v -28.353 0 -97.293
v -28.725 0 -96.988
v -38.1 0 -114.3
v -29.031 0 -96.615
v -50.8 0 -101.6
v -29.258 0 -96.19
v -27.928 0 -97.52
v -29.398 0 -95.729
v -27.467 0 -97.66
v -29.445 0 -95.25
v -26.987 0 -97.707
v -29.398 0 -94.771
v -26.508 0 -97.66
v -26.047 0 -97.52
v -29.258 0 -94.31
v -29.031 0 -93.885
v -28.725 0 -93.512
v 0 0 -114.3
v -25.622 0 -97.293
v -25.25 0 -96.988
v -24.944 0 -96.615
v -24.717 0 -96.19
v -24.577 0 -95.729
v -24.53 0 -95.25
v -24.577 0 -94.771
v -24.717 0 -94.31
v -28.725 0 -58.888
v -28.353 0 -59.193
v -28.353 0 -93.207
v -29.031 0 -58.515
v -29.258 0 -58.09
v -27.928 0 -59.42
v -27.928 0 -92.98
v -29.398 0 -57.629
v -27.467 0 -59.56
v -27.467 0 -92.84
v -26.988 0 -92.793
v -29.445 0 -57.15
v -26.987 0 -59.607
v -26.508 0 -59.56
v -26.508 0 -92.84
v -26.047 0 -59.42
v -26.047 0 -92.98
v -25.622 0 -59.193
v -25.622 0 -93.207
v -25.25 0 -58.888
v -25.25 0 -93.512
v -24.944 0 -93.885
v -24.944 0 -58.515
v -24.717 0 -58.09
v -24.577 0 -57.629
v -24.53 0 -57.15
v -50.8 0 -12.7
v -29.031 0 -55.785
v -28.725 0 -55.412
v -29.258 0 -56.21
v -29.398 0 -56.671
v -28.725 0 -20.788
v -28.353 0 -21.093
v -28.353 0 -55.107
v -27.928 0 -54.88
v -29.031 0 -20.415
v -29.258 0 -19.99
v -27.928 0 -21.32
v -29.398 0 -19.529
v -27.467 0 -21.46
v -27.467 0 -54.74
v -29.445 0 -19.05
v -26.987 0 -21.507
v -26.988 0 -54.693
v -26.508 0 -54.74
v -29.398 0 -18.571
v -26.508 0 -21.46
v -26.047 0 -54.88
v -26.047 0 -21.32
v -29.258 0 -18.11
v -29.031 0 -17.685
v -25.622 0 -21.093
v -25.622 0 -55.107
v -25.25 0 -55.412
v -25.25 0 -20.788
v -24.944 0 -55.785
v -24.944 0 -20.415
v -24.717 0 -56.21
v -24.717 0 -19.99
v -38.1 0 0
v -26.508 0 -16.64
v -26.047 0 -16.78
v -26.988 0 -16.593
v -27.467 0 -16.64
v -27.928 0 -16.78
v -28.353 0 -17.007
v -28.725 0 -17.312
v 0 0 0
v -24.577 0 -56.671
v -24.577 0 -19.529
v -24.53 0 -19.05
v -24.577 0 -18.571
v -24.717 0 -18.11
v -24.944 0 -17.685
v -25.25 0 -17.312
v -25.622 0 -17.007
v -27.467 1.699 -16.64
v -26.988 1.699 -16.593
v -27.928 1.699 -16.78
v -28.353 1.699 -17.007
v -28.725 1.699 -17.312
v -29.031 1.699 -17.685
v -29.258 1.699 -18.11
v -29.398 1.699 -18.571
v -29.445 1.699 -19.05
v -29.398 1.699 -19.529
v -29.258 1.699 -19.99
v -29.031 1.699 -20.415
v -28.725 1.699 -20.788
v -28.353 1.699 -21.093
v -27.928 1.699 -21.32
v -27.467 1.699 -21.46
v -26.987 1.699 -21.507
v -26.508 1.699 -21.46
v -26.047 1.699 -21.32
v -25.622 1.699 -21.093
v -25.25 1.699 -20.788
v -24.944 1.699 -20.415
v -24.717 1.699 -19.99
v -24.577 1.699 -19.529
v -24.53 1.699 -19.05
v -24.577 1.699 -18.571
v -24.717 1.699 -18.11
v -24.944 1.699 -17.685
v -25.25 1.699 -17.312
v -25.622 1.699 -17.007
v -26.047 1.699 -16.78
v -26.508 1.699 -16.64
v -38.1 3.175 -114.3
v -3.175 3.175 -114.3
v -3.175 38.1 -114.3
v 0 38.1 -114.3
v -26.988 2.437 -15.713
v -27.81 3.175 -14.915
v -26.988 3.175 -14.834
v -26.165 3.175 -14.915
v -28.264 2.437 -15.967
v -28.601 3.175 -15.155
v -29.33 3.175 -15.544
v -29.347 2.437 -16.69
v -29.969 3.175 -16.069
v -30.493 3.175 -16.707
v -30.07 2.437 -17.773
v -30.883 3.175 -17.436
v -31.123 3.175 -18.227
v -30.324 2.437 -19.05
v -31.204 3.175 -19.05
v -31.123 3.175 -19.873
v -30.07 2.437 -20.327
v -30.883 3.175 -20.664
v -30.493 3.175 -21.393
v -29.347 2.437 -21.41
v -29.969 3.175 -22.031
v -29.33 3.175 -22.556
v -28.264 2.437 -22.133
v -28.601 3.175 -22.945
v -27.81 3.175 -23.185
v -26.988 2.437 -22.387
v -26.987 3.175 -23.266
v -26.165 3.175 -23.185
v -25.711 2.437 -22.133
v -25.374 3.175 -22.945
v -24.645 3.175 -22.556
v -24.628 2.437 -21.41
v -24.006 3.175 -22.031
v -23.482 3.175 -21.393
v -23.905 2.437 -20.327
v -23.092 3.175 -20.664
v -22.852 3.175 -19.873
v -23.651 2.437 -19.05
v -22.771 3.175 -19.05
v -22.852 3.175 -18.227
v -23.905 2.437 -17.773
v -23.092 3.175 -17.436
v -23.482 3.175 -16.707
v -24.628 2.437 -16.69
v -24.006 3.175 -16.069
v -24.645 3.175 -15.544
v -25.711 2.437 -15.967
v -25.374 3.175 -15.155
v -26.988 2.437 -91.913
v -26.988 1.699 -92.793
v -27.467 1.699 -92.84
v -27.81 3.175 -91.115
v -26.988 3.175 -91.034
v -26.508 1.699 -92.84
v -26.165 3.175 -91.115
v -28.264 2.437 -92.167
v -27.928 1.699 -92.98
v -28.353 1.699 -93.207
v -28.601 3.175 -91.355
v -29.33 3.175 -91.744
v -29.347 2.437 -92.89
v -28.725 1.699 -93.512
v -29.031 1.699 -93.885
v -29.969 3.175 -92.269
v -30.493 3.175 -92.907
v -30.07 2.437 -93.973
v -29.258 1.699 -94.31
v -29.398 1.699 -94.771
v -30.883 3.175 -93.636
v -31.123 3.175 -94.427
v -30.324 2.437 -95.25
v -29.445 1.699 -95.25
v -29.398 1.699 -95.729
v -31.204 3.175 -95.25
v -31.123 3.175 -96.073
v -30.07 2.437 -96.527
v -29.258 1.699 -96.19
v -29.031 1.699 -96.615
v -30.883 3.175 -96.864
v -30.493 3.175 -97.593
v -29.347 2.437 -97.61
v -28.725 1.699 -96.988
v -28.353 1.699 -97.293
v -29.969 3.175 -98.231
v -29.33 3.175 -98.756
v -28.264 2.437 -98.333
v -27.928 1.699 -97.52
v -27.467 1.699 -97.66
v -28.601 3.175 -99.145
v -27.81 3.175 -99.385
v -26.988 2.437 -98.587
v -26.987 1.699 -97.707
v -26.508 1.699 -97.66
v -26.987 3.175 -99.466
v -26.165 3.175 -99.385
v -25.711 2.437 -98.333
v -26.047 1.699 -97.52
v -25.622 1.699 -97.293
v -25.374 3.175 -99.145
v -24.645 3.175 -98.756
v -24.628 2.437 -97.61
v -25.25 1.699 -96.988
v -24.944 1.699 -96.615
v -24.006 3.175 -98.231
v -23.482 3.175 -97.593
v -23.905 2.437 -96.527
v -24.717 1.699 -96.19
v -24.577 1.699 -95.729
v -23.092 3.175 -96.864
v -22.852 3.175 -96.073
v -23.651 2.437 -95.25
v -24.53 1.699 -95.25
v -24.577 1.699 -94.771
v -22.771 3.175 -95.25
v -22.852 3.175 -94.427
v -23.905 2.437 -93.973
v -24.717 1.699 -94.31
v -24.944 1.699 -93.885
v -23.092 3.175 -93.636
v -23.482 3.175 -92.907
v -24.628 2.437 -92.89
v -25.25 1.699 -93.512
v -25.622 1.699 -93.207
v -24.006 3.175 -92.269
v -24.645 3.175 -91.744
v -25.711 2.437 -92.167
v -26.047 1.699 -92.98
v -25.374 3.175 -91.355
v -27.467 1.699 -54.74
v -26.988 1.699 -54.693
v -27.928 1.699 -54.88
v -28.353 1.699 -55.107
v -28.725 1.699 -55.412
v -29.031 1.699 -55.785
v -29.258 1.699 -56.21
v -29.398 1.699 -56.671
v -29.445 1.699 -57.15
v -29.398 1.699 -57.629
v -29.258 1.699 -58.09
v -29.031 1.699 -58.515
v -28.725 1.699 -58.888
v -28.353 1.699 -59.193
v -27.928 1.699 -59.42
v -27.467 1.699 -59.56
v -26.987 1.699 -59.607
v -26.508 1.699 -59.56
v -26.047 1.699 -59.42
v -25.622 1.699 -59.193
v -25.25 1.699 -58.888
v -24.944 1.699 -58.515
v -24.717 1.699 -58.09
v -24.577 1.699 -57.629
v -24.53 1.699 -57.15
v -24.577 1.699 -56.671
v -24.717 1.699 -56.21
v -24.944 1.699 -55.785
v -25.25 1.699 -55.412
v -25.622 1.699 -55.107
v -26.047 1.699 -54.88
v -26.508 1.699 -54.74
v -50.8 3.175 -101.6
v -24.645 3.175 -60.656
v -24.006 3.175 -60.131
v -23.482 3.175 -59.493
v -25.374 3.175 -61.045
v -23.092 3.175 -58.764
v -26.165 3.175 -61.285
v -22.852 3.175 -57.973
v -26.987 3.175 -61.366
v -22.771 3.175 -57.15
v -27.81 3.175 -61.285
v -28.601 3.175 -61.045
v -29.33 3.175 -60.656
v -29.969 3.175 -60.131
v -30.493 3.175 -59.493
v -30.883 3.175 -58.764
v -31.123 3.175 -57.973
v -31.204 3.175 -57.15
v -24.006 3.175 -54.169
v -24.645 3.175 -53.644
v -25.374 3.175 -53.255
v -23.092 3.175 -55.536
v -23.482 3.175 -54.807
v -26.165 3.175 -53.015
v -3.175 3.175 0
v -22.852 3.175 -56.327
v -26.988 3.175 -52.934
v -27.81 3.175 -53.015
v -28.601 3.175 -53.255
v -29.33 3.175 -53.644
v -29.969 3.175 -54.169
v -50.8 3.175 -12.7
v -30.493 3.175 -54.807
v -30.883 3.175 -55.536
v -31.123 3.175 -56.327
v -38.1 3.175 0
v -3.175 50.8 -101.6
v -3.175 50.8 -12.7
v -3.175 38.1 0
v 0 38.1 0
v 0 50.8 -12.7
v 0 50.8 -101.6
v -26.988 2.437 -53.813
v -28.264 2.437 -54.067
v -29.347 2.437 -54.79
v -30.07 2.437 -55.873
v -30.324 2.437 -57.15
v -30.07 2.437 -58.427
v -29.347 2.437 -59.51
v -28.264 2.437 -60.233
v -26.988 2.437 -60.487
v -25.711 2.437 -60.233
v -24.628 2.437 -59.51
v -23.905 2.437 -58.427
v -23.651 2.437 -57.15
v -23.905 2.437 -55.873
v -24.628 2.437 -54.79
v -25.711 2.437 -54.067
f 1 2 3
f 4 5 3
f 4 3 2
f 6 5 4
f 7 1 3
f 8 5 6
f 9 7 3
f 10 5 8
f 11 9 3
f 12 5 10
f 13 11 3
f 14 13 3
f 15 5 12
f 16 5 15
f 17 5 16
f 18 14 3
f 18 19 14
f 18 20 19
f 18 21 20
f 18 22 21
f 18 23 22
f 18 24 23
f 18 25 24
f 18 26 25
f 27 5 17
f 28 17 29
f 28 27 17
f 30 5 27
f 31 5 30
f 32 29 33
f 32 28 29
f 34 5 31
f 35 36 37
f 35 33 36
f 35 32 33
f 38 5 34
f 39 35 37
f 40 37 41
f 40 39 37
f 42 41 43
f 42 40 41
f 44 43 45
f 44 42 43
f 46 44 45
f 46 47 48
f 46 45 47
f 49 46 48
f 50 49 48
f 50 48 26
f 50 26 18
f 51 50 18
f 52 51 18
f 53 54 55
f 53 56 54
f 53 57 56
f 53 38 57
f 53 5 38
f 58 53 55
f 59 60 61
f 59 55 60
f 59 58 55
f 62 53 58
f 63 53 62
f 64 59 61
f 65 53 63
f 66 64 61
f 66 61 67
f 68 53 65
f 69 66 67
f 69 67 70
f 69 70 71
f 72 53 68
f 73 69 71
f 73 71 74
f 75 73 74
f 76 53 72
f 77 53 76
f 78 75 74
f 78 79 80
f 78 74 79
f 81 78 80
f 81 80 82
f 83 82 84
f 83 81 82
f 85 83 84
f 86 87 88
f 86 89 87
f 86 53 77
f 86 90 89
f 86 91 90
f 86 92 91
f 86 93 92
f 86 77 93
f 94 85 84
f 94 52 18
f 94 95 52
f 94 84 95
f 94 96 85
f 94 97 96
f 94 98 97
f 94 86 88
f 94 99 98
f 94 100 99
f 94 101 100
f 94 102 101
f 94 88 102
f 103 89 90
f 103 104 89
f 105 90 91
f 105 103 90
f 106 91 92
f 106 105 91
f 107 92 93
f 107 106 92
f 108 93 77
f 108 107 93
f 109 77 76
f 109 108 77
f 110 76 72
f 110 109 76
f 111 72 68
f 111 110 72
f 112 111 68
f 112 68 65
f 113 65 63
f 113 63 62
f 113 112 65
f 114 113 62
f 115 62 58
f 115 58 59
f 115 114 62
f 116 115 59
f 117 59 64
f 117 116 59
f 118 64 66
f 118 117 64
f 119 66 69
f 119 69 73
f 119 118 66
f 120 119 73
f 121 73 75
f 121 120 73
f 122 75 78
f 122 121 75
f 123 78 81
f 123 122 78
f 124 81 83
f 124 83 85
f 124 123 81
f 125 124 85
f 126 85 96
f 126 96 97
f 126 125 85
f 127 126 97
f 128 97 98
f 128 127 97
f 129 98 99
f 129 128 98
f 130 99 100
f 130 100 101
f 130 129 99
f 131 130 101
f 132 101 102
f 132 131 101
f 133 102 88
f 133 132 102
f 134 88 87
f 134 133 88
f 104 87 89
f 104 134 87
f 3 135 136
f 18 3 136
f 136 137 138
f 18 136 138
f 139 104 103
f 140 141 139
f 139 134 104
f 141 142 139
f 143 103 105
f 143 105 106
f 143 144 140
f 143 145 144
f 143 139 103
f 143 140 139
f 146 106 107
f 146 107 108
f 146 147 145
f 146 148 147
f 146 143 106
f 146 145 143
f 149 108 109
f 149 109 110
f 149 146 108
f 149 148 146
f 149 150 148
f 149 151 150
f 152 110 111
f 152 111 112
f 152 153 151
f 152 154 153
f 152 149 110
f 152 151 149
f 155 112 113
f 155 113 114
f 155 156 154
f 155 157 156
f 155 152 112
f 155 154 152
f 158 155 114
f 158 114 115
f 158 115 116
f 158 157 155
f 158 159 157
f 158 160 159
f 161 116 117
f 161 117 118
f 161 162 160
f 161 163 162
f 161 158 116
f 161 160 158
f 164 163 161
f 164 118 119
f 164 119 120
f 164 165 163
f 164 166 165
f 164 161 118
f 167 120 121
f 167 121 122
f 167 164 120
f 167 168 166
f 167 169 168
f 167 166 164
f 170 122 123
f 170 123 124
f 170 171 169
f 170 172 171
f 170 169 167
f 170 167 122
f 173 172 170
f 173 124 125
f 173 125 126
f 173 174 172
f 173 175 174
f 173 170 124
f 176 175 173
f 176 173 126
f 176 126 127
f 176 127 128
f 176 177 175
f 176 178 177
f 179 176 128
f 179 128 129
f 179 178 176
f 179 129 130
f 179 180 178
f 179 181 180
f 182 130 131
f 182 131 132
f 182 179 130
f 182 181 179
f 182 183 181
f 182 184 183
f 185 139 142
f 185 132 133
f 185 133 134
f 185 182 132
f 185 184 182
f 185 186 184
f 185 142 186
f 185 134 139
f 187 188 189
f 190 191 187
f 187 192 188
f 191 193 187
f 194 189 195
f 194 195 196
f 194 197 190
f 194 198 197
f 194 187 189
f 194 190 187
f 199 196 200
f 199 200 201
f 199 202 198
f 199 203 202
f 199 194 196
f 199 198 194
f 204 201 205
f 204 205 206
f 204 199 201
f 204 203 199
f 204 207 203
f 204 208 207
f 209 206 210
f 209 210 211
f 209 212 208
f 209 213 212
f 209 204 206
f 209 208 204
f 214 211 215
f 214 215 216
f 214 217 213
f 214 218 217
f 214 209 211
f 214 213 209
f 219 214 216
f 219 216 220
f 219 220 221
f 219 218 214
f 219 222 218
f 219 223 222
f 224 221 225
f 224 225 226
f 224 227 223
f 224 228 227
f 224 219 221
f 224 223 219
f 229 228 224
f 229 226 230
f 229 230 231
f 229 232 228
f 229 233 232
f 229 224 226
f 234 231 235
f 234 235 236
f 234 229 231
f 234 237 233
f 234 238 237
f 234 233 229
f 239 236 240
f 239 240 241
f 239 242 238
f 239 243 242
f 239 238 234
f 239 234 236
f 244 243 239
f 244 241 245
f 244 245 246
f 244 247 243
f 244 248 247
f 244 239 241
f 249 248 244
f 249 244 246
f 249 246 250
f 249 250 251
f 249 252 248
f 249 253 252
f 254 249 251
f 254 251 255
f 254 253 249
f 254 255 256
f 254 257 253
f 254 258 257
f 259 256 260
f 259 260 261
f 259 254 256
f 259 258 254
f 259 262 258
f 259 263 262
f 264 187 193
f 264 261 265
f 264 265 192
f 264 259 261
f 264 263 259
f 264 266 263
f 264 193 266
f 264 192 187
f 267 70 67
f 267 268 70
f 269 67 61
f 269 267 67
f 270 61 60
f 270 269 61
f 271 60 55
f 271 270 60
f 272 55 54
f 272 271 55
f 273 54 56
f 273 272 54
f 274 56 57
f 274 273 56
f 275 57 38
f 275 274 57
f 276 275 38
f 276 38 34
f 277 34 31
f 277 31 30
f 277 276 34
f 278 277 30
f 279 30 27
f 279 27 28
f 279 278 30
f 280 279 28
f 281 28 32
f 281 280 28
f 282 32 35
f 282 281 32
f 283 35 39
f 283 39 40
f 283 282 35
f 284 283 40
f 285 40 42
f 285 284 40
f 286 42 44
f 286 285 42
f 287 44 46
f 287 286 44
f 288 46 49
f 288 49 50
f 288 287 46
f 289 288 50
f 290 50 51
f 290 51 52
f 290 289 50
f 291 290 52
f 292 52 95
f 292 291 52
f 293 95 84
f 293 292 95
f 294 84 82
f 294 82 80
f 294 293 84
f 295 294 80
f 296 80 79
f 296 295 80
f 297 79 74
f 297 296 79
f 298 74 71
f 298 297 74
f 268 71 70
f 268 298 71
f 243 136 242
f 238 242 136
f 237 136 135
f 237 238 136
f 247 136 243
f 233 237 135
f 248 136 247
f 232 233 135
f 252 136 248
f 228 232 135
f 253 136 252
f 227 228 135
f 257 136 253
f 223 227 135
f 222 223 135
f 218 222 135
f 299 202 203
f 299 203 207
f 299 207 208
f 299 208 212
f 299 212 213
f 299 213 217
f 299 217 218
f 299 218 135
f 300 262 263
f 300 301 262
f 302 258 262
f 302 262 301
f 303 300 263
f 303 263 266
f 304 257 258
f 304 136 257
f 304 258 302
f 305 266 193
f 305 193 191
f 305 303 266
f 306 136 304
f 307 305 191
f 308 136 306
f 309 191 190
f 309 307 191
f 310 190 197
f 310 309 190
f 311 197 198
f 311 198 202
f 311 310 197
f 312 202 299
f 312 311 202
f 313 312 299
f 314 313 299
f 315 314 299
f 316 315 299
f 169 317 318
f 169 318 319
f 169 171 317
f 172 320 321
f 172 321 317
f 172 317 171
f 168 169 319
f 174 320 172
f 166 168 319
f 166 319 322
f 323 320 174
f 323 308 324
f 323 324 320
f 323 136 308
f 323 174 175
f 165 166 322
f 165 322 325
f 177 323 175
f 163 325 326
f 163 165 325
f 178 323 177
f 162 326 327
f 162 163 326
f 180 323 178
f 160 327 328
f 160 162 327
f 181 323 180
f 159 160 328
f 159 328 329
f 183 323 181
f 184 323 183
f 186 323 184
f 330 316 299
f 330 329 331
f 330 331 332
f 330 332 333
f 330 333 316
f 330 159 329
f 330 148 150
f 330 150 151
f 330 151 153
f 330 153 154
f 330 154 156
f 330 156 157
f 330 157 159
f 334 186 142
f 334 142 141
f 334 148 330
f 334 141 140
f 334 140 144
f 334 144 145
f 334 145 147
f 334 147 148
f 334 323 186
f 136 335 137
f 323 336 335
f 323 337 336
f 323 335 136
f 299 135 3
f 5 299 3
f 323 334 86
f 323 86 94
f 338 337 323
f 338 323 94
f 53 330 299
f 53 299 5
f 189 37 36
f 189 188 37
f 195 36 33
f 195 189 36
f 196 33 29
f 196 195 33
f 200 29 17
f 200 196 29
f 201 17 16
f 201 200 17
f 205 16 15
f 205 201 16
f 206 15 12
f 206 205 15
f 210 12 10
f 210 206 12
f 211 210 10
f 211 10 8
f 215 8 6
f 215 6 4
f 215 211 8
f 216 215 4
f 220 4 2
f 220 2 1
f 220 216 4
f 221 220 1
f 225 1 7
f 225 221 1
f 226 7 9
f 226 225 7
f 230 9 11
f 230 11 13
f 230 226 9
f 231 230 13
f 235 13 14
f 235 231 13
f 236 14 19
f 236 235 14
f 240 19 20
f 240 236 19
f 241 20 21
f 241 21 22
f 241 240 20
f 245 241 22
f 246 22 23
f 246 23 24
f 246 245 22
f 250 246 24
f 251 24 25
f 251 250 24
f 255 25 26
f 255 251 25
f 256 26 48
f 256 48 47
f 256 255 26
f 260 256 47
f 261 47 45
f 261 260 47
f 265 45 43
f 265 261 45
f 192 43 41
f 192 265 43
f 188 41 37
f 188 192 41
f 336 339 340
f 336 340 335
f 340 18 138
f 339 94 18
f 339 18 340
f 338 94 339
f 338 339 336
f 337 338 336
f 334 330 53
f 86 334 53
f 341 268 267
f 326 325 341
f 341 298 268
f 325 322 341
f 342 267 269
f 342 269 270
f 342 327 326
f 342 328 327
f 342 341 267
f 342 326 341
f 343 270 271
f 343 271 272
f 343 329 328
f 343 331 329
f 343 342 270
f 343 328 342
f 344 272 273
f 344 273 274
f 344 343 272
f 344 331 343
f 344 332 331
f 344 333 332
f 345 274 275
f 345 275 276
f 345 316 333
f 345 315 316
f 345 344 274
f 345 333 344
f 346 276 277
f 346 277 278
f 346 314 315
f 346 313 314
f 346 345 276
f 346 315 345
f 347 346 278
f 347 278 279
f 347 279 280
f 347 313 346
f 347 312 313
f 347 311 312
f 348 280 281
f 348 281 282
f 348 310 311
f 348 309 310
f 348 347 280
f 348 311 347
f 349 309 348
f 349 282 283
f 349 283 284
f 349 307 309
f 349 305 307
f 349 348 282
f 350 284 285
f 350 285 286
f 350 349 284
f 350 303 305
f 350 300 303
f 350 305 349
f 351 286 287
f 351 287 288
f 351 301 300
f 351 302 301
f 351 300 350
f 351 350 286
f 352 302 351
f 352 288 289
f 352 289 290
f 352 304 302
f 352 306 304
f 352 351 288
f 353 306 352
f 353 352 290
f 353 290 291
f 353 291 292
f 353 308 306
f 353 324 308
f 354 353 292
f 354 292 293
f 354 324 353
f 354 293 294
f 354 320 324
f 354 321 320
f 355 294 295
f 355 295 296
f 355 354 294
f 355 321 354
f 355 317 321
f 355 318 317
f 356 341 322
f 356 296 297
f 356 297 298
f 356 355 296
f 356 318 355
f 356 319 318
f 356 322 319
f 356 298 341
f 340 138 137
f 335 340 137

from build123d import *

# Parameters (mm, degrees)
BOSS_EXTRUDE1_DEPTH                       = 114.3
CHAMFER1_SIZE                             = 12.7
CSK_FOR_8_FLAT_HEAD_MACHINE_SCREW_2_COUNT = 2
CSK_FOR_8_FLAT_HEAD_MACHINE_SCREW_2_PITCH = 76.2
CSK_FOR_8_FLAT_HEAD_MACHINE_SCREW_3_COUNT = 2
CSK_FOR_8_FLAT_HEAD_MACHINE_SCREW_3_PITCH = 38.1
CSK_FOR_8_FLAT_HEAD_MACHINE_SCREW_4_COUNT = 2
CSK_FOR_8_FLAT_HEAD_MACHINE_SCREW_4_PITCH = 44.45


with BuildPart() as part:
    # Sketch2 → Boss-Extrude1 (new body)
    with BuildSketch(Plane.XY):
        Polygon((0, 0), (0, 50.8), (-3.175, 50.8), (-3.175, 3.175), (-50.8, 3.175), (-50.8, 0), align=None)
    extrude(amount=-BOSS_EXTRUDE1_DEPTH)

    # Chamfer1
    chamfer1_edges = [part.edges().sort_by_distance(p)[0] for p in [
        (-1.5875, 50.8, -114.3),
        (-50.8, 1.5875, -114.3),
        (-50.8, 1.5875, 0),
        (-1.5875, 50.8, 0),
    ]]
    chamfer(chamfer1_edges, length=CHAMFER1_SIZE)

    # Sketch4 → CSK for #8 Flat Head Machine Screw (100)1 (revolve, cut)
    with BuildSketch(Plane(origin=(-26.9875, 3.175, -95.25), x_dir=(0, 0, 1), z_dir=(1, 0, 0))):
        Polygon((0, 0), (0, 3.175), (2.45745, 3.175), (2.45745, 1.475934296), (4.2164, 0), align=None)
    csk_for_8_flat_head_machine_screw_100 = revolve(axis=Axis((-26.9875, 9.525, -95.25), (0, -1, 0)), mode=Mode.SUBTRACT)

    # CSK for _8 Flat Head Machine Screw _ 2: CSK for #8 Flat Head Machine Screw (100)1 ×2
    with Locations(*[(0, 0, i * CSK_FOR_8_FLAT_HEAD_MACHINE_SCREW_2_PITCH) for i in range(1, CSK_FOR_8_FLAT_HEAD_MACHINE_SCREW_2_COUNT)]):
        add(csk_for_8_flat_head_machine_screw_100, mode=Mode.SUBTRACT)

    # CSK for _8 Flat Head Machine Screw _ 3: CSK for #8 Flat Head Machine Screw (100)1 ×2
    with Locations(*[(0, 0, i * CSK_FOR_8_FLAT_HEAD_MACHINE_SCREW_3_PITCH) for i in range(1, CSK_FOR_8_FLAT_HEAD_MACHINE_SCREW_3_COUNT)]):
        add(csk_for_8_flat_head_machine_screw_100, mode=Mode.SUBTRACT)

    # CSK for _8 Flat Head Machine Screw _ 4: CSK for #8 Flat Head Machine Screw (100)1 ×2
    with Locations(*[(0, 0, -i * CSK_FOR_8_FLAT_HEAD_MACHINE_SCREW_4_PITCH) for i in range(1, CSK_FOR_8_FLAT_HEAD_MACHINE_SCREW_4_COUNT)]):
        add(csk_for_8_flat_head_machine_screw_100, mode=Mode.SUBTRACT)


solid = part.part
